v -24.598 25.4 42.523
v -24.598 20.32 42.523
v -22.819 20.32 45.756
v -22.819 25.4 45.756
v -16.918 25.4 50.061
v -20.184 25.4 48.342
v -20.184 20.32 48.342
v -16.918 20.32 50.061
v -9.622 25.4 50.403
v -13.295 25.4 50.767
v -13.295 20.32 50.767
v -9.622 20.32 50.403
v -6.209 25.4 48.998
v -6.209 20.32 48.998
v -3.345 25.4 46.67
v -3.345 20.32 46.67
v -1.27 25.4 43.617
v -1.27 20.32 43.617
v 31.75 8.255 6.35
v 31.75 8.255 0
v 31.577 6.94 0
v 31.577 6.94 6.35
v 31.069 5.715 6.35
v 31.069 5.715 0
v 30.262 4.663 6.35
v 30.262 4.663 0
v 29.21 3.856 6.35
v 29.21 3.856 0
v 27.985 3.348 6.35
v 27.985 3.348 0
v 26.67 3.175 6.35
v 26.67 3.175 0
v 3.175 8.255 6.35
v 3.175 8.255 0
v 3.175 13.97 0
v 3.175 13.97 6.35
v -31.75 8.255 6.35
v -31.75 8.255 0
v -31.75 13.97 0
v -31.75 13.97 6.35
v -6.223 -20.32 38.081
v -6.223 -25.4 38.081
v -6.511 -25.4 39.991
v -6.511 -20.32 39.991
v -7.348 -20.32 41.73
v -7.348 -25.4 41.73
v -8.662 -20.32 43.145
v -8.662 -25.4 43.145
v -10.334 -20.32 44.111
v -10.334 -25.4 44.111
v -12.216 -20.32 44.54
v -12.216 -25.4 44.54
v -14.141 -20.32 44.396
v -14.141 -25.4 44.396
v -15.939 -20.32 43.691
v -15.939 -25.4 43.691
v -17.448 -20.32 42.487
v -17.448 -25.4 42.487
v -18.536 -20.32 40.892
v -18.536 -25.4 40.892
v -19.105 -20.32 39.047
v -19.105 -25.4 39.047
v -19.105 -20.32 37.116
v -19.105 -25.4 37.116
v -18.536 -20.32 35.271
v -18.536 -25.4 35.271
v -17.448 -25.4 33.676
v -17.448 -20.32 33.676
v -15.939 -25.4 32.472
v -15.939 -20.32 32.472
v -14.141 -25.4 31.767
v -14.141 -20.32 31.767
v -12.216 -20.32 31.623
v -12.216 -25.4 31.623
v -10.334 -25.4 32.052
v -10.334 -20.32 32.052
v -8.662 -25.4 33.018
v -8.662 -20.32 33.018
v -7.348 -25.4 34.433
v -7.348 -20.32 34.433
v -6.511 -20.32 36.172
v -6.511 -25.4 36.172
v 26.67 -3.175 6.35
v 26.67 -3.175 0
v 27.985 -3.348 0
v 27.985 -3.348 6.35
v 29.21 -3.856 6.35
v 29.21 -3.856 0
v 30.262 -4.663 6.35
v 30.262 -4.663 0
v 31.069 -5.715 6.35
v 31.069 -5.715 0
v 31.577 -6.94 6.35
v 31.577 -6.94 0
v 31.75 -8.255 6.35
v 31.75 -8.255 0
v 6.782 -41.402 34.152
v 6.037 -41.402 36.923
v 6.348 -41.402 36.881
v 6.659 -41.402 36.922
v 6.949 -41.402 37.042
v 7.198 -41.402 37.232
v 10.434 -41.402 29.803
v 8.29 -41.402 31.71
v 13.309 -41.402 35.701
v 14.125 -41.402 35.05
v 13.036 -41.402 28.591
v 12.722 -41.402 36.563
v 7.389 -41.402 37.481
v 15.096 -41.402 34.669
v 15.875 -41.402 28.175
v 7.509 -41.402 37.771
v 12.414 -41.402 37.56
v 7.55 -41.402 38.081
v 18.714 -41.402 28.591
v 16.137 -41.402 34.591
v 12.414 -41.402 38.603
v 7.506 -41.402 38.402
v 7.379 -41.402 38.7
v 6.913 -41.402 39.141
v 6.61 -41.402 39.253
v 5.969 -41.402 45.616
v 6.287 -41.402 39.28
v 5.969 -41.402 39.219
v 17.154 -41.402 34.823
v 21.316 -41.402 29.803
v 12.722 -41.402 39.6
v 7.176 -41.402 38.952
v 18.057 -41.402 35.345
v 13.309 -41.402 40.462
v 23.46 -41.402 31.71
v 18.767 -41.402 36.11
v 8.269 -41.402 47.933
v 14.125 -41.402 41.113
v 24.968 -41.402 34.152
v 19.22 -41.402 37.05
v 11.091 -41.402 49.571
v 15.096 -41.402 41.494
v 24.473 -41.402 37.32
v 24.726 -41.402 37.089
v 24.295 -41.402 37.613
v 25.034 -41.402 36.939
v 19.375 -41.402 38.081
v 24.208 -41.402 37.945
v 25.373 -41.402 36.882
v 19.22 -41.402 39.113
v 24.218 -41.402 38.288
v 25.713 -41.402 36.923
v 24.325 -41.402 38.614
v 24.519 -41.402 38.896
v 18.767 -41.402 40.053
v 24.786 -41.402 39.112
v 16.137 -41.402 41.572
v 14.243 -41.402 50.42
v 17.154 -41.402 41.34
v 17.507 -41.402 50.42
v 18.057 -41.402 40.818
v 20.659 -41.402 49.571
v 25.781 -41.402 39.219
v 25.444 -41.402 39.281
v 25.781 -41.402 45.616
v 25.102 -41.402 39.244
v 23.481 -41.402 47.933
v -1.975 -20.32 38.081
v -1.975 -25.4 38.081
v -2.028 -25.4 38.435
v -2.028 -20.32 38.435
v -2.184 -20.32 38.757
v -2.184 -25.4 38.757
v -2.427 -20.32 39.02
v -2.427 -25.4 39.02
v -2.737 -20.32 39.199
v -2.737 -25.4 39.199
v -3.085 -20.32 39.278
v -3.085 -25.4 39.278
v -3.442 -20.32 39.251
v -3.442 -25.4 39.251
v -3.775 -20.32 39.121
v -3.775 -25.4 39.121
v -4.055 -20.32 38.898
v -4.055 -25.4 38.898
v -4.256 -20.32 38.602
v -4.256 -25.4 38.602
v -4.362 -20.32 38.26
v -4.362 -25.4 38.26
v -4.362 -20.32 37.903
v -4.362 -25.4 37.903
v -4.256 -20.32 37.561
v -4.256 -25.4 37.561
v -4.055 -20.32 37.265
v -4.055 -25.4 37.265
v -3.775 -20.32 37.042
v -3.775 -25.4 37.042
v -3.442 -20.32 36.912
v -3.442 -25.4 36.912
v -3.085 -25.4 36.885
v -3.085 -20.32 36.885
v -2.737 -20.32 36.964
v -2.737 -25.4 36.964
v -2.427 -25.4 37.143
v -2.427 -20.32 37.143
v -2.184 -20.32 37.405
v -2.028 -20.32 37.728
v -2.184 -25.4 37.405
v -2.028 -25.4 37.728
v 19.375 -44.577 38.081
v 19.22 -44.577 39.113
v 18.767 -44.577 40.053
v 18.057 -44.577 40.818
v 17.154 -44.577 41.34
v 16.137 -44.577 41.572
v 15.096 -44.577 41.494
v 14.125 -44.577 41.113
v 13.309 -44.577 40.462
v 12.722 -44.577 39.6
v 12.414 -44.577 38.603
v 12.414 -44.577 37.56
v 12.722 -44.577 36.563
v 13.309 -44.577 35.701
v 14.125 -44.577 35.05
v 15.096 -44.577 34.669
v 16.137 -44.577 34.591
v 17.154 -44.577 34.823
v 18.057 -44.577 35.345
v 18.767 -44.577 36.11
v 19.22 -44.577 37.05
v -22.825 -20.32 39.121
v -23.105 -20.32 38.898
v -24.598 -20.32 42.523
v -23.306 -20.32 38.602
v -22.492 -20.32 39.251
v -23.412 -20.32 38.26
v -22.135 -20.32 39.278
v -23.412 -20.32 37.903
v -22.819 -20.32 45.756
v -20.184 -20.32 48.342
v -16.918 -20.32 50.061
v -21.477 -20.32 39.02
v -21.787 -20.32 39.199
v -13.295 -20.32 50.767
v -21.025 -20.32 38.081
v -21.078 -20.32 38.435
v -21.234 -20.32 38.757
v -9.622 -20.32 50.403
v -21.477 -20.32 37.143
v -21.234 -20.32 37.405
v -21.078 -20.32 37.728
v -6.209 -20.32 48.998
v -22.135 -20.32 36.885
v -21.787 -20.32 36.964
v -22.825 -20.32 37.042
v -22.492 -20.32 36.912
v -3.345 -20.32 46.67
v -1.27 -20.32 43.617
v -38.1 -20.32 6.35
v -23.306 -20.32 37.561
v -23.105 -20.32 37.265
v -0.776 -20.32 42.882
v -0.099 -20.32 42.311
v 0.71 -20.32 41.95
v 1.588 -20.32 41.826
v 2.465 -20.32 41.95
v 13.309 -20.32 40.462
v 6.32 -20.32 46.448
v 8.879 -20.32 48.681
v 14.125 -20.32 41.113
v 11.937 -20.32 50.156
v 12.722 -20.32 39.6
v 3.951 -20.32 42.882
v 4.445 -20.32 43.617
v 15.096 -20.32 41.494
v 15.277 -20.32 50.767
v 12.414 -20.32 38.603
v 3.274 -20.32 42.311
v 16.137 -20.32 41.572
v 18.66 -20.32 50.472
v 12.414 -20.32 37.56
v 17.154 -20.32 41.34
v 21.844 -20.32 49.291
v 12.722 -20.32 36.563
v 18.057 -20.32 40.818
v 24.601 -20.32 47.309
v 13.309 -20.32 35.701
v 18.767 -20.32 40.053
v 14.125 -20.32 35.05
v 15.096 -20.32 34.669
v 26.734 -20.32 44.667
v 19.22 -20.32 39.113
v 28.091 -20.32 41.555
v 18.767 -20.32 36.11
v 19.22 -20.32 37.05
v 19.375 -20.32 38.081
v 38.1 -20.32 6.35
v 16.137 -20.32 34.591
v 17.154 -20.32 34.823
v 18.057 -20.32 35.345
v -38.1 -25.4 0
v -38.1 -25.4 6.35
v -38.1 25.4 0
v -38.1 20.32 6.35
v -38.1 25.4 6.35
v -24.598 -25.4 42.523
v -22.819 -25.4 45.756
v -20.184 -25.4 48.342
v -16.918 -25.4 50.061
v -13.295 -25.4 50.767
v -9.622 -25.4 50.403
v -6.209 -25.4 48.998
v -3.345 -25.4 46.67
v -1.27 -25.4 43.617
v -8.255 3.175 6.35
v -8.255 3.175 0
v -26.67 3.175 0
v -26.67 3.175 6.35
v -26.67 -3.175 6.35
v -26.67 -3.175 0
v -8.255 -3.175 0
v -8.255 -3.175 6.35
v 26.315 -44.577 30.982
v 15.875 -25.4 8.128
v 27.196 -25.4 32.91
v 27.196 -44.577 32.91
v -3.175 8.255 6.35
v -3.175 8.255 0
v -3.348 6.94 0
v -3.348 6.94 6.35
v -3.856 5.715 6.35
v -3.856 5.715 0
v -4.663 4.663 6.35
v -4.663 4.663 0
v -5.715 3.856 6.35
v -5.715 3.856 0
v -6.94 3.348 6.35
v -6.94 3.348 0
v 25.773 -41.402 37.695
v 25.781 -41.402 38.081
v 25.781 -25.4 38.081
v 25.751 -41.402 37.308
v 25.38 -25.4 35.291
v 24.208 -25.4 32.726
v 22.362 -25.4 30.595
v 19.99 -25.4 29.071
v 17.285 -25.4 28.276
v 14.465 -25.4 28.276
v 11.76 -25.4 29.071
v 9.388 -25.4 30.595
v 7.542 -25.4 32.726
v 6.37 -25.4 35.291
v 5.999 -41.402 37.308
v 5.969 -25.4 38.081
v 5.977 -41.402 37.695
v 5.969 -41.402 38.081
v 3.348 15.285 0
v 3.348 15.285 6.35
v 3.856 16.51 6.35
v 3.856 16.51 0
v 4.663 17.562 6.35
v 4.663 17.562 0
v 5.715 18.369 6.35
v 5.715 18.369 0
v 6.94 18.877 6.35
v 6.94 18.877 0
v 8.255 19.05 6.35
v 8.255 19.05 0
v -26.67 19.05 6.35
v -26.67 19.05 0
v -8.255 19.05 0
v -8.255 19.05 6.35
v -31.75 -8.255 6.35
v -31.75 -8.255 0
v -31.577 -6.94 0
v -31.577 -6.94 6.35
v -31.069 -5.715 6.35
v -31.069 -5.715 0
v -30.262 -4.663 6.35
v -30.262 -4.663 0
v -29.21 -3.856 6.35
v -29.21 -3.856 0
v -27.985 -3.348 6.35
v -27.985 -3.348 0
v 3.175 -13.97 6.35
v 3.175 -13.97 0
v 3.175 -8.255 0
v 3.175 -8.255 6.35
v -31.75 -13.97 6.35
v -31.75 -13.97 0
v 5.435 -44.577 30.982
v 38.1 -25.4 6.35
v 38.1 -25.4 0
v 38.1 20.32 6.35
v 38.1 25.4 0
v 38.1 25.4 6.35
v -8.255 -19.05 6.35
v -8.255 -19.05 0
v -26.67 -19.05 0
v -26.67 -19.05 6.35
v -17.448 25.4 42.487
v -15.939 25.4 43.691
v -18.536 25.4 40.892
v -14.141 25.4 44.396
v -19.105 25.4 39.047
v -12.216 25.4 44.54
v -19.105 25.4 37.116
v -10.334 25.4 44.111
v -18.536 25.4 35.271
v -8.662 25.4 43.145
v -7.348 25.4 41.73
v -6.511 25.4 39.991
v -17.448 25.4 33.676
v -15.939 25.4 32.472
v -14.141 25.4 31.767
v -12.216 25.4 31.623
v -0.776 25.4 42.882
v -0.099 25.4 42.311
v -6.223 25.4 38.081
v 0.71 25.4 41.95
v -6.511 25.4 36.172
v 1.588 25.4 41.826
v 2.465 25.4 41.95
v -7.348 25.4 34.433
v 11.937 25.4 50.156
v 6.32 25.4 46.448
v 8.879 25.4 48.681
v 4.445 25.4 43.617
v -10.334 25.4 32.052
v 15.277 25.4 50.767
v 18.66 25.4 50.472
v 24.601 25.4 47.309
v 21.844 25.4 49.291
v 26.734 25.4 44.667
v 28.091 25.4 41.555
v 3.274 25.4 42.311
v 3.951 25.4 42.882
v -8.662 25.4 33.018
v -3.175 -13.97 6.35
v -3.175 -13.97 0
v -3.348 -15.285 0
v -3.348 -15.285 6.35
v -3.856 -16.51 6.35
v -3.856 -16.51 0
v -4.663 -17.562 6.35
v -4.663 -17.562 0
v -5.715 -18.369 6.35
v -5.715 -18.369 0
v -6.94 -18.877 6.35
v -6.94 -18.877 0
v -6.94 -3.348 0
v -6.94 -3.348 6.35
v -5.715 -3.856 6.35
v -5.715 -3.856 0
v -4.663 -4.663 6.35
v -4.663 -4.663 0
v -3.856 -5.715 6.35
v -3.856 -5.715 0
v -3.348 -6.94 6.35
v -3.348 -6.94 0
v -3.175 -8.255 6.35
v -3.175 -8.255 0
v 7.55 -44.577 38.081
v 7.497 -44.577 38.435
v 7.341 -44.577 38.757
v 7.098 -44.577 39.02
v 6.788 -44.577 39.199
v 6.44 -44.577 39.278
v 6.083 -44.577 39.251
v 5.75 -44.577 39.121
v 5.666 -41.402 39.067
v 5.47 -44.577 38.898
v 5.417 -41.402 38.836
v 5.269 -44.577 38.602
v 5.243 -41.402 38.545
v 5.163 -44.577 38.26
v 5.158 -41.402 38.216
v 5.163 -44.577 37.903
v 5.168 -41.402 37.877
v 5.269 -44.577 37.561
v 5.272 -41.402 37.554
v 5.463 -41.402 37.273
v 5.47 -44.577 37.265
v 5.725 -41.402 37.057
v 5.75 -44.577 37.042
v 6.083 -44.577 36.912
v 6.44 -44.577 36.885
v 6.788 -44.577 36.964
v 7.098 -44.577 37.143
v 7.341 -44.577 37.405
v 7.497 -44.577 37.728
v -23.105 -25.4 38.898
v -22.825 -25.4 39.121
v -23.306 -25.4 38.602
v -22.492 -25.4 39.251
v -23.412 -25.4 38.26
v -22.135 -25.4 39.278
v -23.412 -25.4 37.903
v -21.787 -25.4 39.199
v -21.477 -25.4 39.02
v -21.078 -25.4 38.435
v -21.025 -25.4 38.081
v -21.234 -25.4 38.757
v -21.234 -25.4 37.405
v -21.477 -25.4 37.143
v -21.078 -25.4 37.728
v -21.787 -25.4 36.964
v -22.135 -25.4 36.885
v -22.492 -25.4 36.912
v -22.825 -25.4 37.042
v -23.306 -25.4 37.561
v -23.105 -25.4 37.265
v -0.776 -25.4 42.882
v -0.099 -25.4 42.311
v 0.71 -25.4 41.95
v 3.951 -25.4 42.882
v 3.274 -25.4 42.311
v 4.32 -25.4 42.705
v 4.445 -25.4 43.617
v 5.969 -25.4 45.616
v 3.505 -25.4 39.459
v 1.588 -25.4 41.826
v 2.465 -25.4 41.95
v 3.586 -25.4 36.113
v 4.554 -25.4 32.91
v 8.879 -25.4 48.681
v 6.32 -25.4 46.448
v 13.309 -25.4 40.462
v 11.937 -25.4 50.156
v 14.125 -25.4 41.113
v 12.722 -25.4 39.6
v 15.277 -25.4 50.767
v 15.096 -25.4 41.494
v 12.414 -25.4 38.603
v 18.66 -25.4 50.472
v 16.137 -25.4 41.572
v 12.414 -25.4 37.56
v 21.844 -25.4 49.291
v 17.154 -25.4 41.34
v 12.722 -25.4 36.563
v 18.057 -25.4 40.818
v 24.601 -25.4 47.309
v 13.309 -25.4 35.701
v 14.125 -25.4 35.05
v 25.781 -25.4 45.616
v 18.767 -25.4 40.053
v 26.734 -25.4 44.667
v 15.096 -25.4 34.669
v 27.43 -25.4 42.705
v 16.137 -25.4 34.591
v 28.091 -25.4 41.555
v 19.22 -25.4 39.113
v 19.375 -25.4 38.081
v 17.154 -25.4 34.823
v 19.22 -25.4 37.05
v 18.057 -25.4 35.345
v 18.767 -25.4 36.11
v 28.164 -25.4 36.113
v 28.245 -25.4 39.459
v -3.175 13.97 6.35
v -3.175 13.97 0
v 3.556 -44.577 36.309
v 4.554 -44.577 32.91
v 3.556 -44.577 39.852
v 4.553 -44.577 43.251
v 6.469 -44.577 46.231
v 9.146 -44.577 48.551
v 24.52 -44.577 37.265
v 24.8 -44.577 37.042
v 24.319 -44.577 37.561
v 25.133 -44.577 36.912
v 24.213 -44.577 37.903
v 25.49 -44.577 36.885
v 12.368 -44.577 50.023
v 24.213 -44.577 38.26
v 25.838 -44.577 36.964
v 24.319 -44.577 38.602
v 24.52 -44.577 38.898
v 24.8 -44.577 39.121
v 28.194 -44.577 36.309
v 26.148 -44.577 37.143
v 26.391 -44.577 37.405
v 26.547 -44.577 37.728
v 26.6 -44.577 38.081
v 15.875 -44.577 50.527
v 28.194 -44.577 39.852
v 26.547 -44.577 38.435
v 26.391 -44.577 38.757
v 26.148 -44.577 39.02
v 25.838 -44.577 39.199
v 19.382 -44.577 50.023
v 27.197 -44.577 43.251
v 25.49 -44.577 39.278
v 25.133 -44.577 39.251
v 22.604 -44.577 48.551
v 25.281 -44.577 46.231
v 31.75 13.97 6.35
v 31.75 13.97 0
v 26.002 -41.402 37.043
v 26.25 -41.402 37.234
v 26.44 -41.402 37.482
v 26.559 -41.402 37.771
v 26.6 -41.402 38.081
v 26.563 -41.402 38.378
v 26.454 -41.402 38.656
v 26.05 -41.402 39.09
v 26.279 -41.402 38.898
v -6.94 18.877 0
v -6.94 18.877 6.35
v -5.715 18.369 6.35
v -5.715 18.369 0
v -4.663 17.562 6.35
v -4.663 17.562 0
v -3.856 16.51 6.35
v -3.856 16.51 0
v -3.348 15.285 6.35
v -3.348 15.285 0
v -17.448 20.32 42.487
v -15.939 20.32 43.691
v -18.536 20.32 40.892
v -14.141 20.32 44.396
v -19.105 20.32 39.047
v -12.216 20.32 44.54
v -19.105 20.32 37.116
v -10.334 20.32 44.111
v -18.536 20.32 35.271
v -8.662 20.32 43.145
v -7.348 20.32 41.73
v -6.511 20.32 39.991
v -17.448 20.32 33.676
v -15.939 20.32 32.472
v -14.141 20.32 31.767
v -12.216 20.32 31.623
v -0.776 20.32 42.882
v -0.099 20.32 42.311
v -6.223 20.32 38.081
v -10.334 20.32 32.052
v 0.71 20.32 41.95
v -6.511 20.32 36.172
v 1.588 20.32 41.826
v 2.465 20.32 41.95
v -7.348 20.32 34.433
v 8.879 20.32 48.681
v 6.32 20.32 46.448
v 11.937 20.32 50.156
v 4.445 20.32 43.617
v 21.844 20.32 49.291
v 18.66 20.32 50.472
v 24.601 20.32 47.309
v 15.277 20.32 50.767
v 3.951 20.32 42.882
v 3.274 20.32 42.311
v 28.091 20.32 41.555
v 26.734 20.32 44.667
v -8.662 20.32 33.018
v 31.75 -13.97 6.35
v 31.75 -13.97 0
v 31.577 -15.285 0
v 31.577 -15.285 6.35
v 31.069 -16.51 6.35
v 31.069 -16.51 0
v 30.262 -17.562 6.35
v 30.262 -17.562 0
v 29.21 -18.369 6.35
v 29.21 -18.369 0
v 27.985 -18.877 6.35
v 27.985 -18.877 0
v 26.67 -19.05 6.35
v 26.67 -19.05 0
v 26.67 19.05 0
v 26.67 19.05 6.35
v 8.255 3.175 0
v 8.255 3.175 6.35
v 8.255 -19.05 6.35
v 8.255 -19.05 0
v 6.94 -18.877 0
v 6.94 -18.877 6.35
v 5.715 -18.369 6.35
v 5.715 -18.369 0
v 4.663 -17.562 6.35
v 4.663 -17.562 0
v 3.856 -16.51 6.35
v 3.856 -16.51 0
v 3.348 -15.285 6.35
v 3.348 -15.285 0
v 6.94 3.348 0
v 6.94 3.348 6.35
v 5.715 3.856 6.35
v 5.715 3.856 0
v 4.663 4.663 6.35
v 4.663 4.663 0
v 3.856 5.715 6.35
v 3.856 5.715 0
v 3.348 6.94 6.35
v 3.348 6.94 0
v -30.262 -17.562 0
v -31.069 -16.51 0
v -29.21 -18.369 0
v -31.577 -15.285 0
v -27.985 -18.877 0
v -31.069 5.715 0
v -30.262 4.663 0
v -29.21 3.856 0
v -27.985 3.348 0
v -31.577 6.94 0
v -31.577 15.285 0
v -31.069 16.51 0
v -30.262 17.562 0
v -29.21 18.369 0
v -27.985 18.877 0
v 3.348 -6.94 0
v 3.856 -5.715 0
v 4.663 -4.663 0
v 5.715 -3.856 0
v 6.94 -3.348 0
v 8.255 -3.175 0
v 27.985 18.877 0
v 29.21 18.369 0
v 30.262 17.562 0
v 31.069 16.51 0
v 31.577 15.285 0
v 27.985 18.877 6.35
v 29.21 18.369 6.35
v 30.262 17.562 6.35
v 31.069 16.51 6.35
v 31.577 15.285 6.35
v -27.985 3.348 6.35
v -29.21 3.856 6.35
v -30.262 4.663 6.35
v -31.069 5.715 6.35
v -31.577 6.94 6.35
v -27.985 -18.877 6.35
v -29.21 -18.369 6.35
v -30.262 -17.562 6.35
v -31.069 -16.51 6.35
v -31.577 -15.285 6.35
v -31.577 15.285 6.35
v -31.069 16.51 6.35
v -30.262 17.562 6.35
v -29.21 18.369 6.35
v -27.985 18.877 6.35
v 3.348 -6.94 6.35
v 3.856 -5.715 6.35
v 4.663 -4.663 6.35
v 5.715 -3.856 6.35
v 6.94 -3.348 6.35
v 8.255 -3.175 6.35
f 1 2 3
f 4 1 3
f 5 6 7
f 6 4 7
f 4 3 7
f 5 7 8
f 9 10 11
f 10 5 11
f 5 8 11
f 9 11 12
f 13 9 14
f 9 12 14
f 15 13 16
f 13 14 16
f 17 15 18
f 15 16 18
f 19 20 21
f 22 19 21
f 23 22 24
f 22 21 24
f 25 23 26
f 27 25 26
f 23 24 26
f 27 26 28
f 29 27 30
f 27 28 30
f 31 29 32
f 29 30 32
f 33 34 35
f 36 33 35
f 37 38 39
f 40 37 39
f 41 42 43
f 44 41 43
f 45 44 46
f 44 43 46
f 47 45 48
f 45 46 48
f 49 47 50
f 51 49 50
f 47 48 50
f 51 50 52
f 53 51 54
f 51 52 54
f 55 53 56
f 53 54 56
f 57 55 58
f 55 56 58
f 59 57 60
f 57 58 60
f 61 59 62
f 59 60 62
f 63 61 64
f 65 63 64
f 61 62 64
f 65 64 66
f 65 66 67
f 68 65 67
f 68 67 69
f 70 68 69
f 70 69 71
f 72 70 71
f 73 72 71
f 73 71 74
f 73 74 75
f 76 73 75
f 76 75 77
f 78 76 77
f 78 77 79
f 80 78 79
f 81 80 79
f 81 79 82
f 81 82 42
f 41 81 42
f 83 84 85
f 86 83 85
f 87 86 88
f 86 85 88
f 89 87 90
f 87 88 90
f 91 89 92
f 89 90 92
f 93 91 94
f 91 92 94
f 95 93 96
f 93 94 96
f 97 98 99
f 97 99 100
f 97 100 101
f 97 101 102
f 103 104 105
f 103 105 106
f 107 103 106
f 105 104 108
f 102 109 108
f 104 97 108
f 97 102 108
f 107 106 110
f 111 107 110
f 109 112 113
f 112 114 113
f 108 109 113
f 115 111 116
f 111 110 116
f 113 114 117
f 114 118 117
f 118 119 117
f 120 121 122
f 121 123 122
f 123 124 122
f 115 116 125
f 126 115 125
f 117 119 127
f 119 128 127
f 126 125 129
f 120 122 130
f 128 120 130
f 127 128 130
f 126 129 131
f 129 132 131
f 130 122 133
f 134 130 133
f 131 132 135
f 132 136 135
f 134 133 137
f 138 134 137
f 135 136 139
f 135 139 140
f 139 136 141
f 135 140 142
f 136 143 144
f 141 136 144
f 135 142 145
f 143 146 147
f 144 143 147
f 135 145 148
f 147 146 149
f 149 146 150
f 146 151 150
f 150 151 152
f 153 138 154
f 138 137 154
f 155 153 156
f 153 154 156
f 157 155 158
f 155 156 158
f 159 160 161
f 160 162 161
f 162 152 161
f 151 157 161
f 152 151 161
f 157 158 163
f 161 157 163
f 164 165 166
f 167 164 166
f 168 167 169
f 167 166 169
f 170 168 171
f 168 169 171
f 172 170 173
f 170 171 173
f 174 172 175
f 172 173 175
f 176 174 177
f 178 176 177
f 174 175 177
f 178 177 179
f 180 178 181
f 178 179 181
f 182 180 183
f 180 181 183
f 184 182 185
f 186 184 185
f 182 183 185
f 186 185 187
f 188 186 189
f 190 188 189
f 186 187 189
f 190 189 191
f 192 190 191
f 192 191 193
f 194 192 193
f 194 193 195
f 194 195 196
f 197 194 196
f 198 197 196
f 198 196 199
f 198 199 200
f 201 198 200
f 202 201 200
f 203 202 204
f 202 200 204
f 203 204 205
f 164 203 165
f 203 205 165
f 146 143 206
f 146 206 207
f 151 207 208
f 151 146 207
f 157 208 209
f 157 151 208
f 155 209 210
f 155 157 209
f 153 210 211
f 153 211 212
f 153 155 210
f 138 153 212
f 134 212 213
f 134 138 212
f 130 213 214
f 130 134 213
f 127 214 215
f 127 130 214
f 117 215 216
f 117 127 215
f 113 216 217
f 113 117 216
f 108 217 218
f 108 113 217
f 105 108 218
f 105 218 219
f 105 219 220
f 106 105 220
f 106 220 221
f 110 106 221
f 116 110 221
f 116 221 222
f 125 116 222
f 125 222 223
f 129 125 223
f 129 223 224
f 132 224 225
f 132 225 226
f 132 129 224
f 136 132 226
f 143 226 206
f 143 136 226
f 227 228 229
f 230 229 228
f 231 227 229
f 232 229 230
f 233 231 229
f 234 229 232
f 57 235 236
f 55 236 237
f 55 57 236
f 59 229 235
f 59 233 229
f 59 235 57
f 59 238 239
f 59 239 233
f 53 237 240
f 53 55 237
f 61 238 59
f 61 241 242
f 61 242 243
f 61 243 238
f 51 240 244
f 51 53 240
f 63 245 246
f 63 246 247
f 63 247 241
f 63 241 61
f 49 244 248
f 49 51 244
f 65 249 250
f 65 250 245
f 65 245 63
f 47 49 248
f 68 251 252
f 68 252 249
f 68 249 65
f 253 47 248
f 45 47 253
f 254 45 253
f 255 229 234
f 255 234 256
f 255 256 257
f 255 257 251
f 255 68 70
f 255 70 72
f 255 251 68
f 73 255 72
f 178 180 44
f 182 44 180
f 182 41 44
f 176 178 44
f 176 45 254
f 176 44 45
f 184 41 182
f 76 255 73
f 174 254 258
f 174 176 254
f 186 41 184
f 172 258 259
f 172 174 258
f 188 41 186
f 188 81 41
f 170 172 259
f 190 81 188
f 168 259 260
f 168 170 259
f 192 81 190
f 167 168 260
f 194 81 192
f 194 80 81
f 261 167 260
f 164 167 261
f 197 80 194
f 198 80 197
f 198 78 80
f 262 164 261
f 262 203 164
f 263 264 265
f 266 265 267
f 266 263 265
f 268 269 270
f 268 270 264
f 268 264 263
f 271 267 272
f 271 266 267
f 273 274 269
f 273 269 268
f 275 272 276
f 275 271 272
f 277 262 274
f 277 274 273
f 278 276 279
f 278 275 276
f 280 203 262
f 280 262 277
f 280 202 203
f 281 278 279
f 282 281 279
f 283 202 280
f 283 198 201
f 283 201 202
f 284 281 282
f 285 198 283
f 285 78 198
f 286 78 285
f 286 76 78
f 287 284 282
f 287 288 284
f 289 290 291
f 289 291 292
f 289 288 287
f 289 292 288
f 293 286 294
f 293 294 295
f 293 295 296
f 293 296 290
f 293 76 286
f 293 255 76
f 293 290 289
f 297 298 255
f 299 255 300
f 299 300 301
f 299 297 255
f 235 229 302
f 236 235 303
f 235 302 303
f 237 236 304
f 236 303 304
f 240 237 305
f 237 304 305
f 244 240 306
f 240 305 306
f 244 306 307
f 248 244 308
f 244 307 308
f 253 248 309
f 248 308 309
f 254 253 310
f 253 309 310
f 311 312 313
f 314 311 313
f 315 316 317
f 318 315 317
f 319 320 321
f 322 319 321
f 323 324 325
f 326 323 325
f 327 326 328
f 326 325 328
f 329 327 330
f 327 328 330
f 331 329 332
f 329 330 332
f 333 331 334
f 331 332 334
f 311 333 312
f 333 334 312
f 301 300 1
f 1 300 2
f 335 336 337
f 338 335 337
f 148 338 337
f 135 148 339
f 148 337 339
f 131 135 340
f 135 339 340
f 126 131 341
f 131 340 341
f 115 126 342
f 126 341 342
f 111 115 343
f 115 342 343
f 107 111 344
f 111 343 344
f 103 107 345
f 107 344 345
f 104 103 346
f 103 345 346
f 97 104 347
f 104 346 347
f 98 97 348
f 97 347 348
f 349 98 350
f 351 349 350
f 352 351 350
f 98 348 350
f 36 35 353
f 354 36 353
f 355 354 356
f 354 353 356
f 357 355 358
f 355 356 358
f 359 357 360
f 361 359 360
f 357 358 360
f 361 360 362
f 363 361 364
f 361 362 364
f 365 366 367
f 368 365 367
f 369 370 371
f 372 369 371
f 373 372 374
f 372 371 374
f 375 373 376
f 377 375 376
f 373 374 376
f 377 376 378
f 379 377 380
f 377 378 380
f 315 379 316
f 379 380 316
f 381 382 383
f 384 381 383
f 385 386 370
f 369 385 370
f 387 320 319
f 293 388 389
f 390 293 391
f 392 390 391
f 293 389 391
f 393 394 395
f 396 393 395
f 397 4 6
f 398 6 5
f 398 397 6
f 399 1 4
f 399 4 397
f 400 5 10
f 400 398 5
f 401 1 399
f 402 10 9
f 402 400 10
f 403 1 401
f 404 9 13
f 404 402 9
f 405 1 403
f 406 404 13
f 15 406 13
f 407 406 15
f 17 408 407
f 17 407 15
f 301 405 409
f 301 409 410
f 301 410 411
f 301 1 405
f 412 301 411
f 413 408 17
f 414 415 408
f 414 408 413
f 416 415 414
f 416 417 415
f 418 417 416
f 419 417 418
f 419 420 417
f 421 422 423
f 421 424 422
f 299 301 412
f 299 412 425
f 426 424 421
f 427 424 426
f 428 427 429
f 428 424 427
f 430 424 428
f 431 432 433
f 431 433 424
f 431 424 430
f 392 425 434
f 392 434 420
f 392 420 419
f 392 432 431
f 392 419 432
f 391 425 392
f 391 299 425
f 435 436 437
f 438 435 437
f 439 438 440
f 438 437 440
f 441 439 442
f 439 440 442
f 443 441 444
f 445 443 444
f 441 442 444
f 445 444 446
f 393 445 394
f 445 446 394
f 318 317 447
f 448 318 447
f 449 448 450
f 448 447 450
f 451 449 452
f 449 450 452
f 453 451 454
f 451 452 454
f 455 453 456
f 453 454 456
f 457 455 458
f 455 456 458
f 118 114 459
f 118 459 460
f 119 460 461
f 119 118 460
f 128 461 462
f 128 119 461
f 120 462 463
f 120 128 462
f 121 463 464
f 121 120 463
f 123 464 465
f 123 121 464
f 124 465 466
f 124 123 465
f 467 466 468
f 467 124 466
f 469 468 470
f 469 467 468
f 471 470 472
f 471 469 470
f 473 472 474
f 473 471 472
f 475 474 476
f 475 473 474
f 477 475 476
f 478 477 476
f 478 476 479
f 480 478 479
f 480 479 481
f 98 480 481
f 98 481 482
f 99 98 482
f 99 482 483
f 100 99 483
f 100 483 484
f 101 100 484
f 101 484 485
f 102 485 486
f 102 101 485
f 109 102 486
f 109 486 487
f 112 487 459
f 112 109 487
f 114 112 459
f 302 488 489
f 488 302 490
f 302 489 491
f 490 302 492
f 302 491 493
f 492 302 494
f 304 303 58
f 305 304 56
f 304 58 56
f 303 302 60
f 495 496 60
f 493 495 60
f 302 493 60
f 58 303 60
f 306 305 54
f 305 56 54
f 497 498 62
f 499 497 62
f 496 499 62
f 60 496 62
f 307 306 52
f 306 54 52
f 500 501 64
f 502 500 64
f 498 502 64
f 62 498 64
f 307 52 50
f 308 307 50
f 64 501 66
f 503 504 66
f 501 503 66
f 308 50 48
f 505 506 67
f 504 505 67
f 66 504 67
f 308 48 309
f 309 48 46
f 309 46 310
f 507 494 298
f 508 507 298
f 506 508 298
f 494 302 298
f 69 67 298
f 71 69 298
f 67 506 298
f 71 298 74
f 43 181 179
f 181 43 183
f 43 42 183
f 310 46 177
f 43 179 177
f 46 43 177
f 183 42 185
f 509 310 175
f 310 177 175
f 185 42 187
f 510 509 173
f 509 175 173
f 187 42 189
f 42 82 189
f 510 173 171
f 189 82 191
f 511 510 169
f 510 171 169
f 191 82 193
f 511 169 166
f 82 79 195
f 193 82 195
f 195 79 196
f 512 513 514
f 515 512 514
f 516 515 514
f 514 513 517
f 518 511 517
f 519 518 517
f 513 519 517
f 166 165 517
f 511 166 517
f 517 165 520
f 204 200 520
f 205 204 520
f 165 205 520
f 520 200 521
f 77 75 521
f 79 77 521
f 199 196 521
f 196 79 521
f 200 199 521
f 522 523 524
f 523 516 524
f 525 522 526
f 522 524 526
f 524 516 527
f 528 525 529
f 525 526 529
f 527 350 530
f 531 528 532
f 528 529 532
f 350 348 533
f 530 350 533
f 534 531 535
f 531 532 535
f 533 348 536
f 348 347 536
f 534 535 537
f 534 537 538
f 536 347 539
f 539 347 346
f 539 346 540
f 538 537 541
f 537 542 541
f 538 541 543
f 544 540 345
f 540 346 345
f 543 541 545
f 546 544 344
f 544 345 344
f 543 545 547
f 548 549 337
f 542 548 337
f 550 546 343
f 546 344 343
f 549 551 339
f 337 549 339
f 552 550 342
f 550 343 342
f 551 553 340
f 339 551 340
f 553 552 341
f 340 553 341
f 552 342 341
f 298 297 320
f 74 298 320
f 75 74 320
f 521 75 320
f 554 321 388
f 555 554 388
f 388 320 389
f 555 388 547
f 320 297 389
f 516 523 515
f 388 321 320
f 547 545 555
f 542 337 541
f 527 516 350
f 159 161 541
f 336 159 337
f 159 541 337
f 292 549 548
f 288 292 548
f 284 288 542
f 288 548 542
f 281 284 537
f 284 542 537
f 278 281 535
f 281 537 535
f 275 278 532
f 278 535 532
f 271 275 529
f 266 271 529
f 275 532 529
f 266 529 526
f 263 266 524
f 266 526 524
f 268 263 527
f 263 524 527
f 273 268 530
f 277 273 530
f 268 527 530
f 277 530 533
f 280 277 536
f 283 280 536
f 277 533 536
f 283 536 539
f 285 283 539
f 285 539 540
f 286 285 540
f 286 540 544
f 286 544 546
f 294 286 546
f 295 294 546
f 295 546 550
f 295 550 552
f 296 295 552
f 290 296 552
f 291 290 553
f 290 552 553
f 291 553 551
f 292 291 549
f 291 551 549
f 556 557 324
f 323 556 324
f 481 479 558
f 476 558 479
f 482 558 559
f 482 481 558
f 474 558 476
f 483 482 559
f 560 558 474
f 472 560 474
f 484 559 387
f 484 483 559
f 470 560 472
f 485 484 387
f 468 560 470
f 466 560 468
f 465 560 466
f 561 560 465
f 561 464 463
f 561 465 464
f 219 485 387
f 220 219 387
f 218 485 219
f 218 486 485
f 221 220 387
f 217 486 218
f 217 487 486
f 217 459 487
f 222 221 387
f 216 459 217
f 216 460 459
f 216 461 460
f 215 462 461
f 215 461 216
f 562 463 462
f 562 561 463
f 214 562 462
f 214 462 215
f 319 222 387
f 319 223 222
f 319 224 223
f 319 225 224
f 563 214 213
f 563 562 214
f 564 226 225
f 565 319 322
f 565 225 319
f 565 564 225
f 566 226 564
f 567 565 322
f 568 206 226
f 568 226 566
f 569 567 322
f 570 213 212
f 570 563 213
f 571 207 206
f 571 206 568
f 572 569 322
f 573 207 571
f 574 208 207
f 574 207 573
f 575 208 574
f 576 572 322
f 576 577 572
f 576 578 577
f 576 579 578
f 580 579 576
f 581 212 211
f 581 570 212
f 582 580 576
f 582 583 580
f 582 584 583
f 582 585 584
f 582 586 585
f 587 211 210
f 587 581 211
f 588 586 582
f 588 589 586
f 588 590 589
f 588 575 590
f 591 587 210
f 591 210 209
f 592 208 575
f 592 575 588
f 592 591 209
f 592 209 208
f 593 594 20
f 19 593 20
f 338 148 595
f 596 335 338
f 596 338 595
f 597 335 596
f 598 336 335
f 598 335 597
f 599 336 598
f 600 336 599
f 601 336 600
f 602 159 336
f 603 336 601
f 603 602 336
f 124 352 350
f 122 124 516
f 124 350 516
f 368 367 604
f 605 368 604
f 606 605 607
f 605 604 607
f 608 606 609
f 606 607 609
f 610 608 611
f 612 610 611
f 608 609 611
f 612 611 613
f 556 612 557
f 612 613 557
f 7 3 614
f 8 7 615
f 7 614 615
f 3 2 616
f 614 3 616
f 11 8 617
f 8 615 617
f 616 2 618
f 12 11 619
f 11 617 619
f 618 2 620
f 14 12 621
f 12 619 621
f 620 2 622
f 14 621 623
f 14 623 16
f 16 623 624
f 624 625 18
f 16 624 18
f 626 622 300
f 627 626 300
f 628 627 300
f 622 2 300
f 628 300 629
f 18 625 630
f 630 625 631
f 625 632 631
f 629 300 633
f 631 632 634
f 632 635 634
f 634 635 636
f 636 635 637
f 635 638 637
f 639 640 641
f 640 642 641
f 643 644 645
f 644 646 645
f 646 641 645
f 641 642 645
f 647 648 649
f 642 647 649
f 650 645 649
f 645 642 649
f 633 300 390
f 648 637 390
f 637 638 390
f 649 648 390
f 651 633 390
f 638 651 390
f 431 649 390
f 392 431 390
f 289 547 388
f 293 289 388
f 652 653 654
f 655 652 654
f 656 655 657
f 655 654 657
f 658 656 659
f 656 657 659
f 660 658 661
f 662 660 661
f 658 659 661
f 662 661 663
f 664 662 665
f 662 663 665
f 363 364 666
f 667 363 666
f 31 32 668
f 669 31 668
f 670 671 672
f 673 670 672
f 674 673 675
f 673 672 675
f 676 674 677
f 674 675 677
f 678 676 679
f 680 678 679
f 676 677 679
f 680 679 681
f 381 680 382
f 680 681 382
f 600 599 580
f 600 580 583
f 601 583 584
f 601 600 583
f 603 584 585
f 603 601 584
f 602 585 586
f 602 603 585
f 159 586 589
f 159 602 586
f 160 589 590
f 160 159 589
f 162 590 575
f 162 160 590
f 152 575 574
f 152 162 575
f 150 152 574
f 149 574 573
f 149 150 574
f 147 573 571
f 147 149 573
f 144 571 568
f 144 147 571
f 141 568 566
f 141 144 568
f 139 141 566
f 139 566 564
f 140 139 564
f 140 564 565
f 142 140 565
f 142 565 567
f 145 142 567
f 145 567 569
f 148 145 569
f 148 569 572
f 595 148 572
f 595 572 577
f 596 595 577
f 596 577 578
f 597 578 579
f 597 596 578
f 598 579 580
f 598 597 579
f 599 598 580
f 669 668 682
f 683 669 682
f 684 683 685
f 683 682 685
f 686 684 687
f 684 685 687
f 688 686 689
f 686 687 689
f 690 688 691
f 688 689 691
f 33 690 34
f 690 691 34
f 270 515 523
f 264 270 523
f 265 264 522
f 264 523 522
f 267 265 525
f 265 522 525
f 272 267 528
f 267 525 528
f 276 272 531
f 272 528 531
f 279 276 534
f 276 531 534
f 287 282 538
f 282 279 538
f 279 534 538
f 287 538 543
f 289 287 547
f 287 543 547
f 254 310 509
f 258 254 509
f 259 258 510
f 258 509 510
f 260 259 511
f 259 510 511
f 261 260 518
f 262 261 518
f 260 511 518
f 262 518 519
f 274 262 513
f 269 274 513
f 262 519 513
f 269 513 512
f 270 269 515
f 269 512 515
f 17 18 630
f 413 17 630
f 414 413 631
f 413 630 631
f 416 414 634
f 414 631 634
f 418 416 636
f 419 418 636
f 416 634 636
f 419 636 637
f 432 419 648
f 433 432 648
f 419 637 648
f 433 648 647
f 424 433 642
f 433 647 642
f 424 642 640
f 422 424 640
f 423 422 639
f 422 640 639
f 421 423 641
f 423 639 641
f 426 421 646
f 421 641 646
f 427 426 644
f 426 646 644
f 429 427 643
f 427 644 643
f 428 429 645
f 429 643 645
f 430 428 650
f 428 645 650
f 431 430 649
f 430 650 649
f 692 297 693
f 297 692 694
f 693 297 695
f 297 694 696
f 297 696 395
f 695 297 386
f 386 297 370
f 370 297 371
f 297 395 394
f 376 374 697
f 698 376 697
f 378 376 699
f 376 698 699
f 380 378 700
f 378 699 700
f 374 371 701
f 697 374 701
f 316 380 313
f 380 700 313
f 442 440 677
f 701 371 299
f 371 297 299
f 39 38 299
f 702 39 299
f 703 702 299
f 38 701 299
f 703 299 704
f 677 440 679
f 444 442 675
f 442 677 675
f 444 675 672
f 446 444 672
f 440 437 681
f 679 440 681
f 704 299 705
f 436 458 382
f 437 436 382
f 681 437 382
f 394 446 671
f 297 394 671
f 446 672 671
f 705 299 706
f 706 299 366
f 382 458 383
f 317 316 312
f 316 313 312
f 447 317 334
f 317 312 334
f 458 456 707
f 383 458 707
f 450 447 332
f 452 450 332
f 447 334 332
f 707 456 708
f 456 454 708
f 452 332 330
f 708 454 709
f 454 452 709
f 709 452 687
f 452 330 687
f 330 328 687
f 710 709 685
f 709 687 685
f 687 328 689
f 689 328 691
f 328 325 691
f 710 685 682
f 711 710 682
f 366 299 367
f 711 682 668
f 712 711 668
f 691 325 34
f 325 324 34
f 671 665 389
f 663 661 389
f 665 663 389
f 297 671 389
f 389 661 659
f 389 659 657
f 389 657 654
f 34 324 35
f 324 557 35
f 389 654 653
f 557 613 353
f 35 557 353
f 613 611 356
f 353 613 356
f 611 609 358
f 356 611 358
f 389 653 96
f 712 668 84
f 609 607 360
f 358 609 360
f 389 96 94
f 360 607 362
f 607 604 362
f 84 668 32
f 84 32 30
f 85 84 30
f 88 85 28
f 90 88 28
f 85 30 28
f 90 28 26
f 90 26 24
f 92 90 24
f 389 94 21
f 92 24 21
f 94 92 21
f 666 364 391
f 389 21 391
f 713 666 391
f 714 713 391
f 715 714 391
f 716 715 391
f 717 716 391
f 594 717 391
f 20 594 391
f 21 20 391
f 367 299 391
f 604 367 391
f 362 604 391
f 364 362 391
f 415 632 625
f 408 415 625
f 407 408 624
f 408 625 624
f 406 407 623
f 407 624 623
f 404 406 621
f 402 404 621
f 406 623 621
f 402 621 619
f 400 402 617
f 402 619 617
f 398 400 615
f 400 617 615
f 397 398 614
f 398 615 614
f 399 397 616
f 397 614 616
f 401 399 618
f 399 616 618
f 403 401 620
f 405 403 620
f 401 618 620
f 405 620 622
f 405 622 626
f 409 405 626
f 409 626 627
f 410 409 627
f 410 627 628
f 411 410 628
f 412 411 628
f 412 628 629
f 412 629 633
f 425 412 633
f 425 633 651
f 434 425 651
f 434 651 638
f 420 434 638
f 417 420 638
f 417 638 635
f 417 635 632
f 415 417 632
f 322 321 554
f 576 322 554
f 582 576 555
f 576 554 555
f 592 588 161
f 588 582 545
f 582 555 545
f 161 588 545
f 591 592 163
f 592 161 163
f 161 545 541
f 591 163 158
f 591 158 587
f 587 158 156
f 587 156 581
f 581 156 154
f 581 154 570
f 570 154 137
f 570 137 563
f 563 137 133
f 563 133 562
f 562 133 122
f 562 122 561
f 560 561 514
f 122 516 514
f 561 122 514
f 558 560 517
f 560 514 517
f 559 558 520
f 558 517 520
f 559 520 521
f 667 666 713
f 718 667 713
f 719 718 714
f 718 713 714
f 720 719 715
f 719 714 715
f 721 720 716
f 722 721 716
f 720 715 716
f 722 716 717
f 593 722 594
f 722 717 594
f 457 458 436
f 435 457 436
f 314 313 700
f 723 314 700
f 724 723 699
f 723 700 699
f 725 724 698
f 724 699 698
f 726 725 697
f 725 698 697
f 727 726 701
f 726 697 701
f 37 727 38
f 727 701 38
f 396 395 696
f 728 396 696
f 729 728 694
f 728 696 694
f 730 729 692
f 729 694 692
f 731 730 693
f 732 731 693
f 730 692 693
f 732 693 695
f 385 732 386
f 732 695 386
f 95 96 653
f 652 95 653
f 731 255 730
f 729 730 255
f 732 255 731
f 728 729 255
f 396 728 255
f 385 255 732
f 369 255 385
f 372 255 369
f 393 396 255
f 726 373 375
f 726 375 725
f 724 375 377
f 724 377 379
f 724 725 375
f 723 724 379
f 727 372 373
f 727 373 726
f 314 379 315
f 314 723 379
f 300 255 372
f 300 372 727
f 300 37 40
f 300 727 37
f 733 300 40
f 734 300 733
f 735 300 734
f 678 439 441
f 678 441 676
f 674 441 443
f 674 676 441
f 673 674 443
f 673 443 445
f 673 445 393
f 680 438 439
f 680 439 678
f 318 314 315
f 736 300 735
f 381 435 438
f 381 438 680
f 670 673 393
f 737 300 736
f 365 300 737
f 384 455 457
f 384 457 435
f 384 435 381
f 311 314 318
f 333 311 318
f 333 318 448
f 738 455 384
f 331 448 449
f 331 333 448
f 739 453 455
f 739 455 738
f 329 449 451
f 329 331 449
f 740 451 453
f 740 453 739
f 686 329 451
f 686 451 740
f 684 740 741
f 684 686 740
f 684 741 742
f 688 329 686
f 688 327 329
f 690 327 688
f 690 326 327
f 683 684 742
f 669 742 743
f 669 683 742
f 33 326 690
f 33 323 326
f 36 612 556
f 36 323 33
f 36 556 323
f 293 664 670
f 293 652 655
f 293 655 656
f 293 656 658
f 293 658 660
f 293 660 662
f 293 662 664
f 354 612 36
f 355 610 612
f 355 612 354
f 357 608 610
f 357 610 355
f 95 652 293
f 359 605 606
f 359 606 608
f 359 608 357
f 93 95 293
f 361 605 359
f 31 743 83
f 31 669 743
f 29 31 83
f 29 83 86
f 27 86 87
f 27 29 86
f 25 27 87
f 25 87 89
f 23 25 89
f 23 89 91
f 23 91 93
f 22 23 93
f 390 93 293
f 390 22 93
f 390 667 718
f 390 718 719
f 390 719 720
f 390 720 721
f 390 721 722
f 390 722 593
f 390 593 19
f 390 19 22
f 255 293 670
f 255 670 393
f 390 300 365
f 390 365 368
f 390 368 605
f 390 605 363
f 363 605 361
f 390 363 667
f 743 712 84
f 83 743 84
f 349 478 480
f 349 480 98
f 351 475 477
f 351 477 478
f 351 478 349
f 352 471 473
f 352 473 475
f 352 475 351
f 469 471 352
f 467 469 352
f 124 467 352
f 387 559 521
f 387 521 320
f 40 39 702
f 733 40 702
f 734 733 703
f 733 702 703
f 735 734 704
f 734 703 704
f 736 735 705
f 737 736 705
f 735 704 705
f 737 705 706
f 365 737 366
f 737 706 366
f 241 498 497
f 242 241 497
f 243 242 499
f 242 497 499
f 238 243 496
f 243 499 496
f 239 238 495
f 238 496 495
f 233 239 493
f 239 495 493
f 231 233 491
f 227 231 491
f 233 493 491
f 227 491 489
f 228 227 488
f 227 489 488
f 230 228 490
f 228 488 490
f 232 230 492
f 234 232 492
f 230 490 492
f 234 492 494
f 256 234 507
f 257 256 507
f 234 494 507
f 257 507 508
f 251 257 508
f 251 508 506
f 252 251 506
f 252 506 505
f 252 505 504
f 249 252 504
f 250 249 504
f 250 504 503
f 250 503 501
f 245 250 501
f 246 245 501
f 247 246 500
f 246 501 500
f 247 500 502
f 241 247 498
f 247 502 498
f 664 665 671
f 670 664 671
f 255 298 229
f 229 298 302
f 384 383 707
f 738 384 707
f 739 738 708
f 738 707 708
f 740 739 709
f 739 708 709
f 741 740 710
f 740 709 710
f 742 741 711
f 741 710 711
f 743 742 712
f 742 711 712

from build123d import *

# Parameters (mm, degrees)
F0_W           = 76.2
F0_H           = 50.8
F1_DEPTH       = 6.35
F2_W           = 76.2
F2_H           = 5.08
F3_DEPTH       = 101.6
F4_R           = 6.477
F5_DEPTH       = 50.801
F4_R_2         = 1.2
F4_R_3         = 3.5
F6_DEPTH       = 5.08
F8_DEPTH       = 16.002
F9_R           = 12.446
F9_R_2         = 1.2
F9_R_3         = 3.5
F10_DEPTH      = 3.175
F12_DEPTH      = 19.177
F14_DEPTH      = 38.101
F14_DEPTH_BACK = 38.101


# Not quite as in the source:
# - a feature names something its author has since deleted; it is built from what else it names


with BuildPart() as f1:
    # F0 (on Top) → F1 (new body)
    with BuildSketch(Plane.XY):
        Rectangle(F0_W, F0_H)
        with BuildLine():
            ThreePointArc((-31.75, -8.255), (-30.2621024484, -4.6628975516), (-26.67, -3.175))
            Line((-26.67, -3.175), (-8.255, -3.175))
            ThreePointArc((-8.255, -3.175), (-4.6628975516, -4.6628975516), (-3.175, -8.255))
            Line((-3.175, -8.255), (-3.175, -13.97))
            ThreePointArc((-3.175, -13.97), (-4.6628975516, -17.5621024484), (-8.255, -19.05))
            Line((-8.255, -19.05), (-26.67, -19.05))
            ThreePointArc((-26.67, -19.05), (-30.2621024484, -17.5621024484), (-31.75, -13.97))
            Line((-31.75, -13.97), (-31.75, -8.255))
        make_face(mode=Mode.SUBTRACT)
        with BuildLine():
            ThreePointArc((8.255, -19.05), (4.6628975516, -17.5621024484), (3.175, -13.97))
            Line((3.175, -13.97), (3.175, -8.255))
            ThreePointArc((3.175, -8.255), (4.6628975516, -4.6628975516), (8.255, -3.175))
            Line((8.255, -3.175), (26.67, -3.175))
            ThreePointArc((26.67, -3.175), (30.2621024484, -4.6628975516), (31.75, -8.255))
            Line((31.75, -8.255), (31.75, -13.97))
            ThreePointArc((31.75, -13.97), (30.2621024484, -17.5621024484), (26.67, -19.05))
            Line((26.67, -19.05), (8.255, -19.05))
        make_face(mode=Mode.SUBTRACT)
        with BuildLine():
            ThreePointArc((-31.75, 13.97), (-30.2621024484, 17.5621024484), (-26.67, 19.05))
            Line((-26.67, 19.05), (-8.255, 19.05))
            ThreePointArc((-8.255, 19.05), (-4.6628975516, 17.5621024484), (-3.175, 13.97))
            Line((-3.175, 13.97), (-3.175, 8.255))
            ThreePointArc((-3.175, 8.255), (-4.6628975516, 4.6628975516), (-8.255, 3.175))
            Line((-8.255, 3.175), (-26.67, 3.175))
            ThreePointArc((-26.67, 3.175), (-30.2621024484, 4.6628975516), (-31.75, 8.255))
            Line((-31.75, 8.255), (-31.75, 13.97))
        make_face(mode=Mode.SUBTRACT)
        with BuildLine():
            Line((31.75, 13.97), (31.75, 8.255))
            ThreePointArc((31.75, 8.255), (30.2621024484, 4.6628975516), (26.67, 3.175))
            Line((26.67, 3.175), (8.255, 3.175))
            ThreePointArc((8.255, 3.175), (4.6628975516, 4.6628975516), (3.175, 8.255))
            Line((3.175, 8.255), (3.175, 13.97))
            ThreePointArc((3.175, 13.97), (4.6628975516, 17.5621024484), (8.255, 19.05))
            Line((8.255, 19.05), (26.67, 19.05))
            ThreePointArc((26.67, 19.05), (30.2621024484, 17.5621024484), (31.75, 13.97))
        make_face(mode=Mode.SUBTRACT)
    extrude(amount=F1_DEPTH)

    # F2 (on face) → F3 (join)
    with BuildSketch(Plane.XY.offset(6.35)):
        with Locations((0, 22.86)):
            Rectangle(F2_W, F2_H)
        with Locations((0, -22.86)):
            Rectangle(F2_W, F2_H)
    extrude(amount=F3_DEPTH)

    # F4 (on face) → F5 (cut, through all)
    with BuildSketch(Plane.XZ.offset(25.4)):
        with BuildLine():
            Line((28.0908644484, 41.5545914238), (38.1, 6.35))
            Line((38.1, 6.35), (38.1, 107.95))
            Line((38.1, 107.95), (-38.1, 107.95))
            Line((-38.1, 107.95), (-38.1, 6.35))
            Line((-38.1, 6.35), (-24.5981673582, 42.522585505))
            ThreePointArc((-24.5981673582, 42.522585505), (-13.2952924023, 50.7674986335), (-1.27, 43.6172596583))
            ThreePointArc((-1.27, 43.6172596583), (1.5875, 41.8262100729), (4.445, 43.6172596583))
            ThreePointArc((4.445, 43.6172596583), (16.9786511198, 50.7334125607), (28.0908644484, 41.5545914238))
        make_face()
        with Locations((-12.7, 38.081458)):
            Circle(F4_R)
    extrude(amount=-F5_DEPTH, mode=Mode.SUBTRACT)

    # F4 (on face) → F6 (cut, through all)
    with BuildSketch(Plane.XZ.offset(25.4)):
        with Locations((-3.175, 38.081458)):
            Circle(F4_R_2)
        with Locations((-22.225, 38.081458)):
            Circle(F4_R_2)
        with Locations((15.875, 38.081458)):
            Circle(F4_R_3)
    extrude(amount=-F6_DEPTH, mode=Mode.SUBTRACT)

    # F7 (on face) → F8 (join)
    with BuildSketch(Plane.XZ.offset(25.4)):
        with BuildLine():
            ThreePointArc((25.781, 38.081458), (15.875, 28.175458), (5.969, 38.081458))
            Line((5.969, 38.081458), (5.969, 45.6163156629))
            ThreePointArc((5.969, 45.6163156629), (15.875, 25.635458), (25.781, 45.6163156629))
            Line((25.781, 45.6163156629), (25.781, 38.081458))
        make_face()
    extrude(amount=F8_DEPTH)

    # F9 (on face) → F10 (join)
    with BuildSketch(Plane.XZ.offset(41.402)):
        with Locations((15.875, 38.081458)):
            Circle(F9_R)
        with Locations((6.35, 38.081458)):
            Circle(F9_R_2, mode=Mode.SUBTRACT)
        with Locations((15.875, 38.081458)):
            Circle(F9_R_3, mode=Mode.SUBTRACT)
        with Locations((25.4, 38.081458)):
            Circle(F9_R_2, mode=Mode.SUBTRACT)
    extrude(amount=F10_DEPTH)

    # F11 (on face) → F12 (join, through all)
    with BuildSketch(Plane.XZ.offset(25.4)):
        with BuildLine():
            Line((4.5542674961, 32.9100044737), (15.875, 8.128))
            Line((15.875, 8.128), (27.1957325039, 32.9100044737))
            ThreePointArc((27.1957325039, 32.9100044737), (15.875, 25.635458), (4.5542674961, 32.9100044737))
        make_face()
    extrude(amount=F12_DEPTH)

    # F13 (on Right) → F14 (cut, two sides)
    with BuildSketch(Plane.YZ) as f14_sk:
        Polygon((-25.4, 8.128), (-44.577, 30.9822586452), (-44.577, 8.128), align=None)
    extrude(amount=-F14_DEPTH, mode=Mode.SUBTRACT)
    extrude(f14_sk.sketch, amount=F14_DEPTH_BACK, mode=Mode.SUBTRACT)


solid = f1.part
